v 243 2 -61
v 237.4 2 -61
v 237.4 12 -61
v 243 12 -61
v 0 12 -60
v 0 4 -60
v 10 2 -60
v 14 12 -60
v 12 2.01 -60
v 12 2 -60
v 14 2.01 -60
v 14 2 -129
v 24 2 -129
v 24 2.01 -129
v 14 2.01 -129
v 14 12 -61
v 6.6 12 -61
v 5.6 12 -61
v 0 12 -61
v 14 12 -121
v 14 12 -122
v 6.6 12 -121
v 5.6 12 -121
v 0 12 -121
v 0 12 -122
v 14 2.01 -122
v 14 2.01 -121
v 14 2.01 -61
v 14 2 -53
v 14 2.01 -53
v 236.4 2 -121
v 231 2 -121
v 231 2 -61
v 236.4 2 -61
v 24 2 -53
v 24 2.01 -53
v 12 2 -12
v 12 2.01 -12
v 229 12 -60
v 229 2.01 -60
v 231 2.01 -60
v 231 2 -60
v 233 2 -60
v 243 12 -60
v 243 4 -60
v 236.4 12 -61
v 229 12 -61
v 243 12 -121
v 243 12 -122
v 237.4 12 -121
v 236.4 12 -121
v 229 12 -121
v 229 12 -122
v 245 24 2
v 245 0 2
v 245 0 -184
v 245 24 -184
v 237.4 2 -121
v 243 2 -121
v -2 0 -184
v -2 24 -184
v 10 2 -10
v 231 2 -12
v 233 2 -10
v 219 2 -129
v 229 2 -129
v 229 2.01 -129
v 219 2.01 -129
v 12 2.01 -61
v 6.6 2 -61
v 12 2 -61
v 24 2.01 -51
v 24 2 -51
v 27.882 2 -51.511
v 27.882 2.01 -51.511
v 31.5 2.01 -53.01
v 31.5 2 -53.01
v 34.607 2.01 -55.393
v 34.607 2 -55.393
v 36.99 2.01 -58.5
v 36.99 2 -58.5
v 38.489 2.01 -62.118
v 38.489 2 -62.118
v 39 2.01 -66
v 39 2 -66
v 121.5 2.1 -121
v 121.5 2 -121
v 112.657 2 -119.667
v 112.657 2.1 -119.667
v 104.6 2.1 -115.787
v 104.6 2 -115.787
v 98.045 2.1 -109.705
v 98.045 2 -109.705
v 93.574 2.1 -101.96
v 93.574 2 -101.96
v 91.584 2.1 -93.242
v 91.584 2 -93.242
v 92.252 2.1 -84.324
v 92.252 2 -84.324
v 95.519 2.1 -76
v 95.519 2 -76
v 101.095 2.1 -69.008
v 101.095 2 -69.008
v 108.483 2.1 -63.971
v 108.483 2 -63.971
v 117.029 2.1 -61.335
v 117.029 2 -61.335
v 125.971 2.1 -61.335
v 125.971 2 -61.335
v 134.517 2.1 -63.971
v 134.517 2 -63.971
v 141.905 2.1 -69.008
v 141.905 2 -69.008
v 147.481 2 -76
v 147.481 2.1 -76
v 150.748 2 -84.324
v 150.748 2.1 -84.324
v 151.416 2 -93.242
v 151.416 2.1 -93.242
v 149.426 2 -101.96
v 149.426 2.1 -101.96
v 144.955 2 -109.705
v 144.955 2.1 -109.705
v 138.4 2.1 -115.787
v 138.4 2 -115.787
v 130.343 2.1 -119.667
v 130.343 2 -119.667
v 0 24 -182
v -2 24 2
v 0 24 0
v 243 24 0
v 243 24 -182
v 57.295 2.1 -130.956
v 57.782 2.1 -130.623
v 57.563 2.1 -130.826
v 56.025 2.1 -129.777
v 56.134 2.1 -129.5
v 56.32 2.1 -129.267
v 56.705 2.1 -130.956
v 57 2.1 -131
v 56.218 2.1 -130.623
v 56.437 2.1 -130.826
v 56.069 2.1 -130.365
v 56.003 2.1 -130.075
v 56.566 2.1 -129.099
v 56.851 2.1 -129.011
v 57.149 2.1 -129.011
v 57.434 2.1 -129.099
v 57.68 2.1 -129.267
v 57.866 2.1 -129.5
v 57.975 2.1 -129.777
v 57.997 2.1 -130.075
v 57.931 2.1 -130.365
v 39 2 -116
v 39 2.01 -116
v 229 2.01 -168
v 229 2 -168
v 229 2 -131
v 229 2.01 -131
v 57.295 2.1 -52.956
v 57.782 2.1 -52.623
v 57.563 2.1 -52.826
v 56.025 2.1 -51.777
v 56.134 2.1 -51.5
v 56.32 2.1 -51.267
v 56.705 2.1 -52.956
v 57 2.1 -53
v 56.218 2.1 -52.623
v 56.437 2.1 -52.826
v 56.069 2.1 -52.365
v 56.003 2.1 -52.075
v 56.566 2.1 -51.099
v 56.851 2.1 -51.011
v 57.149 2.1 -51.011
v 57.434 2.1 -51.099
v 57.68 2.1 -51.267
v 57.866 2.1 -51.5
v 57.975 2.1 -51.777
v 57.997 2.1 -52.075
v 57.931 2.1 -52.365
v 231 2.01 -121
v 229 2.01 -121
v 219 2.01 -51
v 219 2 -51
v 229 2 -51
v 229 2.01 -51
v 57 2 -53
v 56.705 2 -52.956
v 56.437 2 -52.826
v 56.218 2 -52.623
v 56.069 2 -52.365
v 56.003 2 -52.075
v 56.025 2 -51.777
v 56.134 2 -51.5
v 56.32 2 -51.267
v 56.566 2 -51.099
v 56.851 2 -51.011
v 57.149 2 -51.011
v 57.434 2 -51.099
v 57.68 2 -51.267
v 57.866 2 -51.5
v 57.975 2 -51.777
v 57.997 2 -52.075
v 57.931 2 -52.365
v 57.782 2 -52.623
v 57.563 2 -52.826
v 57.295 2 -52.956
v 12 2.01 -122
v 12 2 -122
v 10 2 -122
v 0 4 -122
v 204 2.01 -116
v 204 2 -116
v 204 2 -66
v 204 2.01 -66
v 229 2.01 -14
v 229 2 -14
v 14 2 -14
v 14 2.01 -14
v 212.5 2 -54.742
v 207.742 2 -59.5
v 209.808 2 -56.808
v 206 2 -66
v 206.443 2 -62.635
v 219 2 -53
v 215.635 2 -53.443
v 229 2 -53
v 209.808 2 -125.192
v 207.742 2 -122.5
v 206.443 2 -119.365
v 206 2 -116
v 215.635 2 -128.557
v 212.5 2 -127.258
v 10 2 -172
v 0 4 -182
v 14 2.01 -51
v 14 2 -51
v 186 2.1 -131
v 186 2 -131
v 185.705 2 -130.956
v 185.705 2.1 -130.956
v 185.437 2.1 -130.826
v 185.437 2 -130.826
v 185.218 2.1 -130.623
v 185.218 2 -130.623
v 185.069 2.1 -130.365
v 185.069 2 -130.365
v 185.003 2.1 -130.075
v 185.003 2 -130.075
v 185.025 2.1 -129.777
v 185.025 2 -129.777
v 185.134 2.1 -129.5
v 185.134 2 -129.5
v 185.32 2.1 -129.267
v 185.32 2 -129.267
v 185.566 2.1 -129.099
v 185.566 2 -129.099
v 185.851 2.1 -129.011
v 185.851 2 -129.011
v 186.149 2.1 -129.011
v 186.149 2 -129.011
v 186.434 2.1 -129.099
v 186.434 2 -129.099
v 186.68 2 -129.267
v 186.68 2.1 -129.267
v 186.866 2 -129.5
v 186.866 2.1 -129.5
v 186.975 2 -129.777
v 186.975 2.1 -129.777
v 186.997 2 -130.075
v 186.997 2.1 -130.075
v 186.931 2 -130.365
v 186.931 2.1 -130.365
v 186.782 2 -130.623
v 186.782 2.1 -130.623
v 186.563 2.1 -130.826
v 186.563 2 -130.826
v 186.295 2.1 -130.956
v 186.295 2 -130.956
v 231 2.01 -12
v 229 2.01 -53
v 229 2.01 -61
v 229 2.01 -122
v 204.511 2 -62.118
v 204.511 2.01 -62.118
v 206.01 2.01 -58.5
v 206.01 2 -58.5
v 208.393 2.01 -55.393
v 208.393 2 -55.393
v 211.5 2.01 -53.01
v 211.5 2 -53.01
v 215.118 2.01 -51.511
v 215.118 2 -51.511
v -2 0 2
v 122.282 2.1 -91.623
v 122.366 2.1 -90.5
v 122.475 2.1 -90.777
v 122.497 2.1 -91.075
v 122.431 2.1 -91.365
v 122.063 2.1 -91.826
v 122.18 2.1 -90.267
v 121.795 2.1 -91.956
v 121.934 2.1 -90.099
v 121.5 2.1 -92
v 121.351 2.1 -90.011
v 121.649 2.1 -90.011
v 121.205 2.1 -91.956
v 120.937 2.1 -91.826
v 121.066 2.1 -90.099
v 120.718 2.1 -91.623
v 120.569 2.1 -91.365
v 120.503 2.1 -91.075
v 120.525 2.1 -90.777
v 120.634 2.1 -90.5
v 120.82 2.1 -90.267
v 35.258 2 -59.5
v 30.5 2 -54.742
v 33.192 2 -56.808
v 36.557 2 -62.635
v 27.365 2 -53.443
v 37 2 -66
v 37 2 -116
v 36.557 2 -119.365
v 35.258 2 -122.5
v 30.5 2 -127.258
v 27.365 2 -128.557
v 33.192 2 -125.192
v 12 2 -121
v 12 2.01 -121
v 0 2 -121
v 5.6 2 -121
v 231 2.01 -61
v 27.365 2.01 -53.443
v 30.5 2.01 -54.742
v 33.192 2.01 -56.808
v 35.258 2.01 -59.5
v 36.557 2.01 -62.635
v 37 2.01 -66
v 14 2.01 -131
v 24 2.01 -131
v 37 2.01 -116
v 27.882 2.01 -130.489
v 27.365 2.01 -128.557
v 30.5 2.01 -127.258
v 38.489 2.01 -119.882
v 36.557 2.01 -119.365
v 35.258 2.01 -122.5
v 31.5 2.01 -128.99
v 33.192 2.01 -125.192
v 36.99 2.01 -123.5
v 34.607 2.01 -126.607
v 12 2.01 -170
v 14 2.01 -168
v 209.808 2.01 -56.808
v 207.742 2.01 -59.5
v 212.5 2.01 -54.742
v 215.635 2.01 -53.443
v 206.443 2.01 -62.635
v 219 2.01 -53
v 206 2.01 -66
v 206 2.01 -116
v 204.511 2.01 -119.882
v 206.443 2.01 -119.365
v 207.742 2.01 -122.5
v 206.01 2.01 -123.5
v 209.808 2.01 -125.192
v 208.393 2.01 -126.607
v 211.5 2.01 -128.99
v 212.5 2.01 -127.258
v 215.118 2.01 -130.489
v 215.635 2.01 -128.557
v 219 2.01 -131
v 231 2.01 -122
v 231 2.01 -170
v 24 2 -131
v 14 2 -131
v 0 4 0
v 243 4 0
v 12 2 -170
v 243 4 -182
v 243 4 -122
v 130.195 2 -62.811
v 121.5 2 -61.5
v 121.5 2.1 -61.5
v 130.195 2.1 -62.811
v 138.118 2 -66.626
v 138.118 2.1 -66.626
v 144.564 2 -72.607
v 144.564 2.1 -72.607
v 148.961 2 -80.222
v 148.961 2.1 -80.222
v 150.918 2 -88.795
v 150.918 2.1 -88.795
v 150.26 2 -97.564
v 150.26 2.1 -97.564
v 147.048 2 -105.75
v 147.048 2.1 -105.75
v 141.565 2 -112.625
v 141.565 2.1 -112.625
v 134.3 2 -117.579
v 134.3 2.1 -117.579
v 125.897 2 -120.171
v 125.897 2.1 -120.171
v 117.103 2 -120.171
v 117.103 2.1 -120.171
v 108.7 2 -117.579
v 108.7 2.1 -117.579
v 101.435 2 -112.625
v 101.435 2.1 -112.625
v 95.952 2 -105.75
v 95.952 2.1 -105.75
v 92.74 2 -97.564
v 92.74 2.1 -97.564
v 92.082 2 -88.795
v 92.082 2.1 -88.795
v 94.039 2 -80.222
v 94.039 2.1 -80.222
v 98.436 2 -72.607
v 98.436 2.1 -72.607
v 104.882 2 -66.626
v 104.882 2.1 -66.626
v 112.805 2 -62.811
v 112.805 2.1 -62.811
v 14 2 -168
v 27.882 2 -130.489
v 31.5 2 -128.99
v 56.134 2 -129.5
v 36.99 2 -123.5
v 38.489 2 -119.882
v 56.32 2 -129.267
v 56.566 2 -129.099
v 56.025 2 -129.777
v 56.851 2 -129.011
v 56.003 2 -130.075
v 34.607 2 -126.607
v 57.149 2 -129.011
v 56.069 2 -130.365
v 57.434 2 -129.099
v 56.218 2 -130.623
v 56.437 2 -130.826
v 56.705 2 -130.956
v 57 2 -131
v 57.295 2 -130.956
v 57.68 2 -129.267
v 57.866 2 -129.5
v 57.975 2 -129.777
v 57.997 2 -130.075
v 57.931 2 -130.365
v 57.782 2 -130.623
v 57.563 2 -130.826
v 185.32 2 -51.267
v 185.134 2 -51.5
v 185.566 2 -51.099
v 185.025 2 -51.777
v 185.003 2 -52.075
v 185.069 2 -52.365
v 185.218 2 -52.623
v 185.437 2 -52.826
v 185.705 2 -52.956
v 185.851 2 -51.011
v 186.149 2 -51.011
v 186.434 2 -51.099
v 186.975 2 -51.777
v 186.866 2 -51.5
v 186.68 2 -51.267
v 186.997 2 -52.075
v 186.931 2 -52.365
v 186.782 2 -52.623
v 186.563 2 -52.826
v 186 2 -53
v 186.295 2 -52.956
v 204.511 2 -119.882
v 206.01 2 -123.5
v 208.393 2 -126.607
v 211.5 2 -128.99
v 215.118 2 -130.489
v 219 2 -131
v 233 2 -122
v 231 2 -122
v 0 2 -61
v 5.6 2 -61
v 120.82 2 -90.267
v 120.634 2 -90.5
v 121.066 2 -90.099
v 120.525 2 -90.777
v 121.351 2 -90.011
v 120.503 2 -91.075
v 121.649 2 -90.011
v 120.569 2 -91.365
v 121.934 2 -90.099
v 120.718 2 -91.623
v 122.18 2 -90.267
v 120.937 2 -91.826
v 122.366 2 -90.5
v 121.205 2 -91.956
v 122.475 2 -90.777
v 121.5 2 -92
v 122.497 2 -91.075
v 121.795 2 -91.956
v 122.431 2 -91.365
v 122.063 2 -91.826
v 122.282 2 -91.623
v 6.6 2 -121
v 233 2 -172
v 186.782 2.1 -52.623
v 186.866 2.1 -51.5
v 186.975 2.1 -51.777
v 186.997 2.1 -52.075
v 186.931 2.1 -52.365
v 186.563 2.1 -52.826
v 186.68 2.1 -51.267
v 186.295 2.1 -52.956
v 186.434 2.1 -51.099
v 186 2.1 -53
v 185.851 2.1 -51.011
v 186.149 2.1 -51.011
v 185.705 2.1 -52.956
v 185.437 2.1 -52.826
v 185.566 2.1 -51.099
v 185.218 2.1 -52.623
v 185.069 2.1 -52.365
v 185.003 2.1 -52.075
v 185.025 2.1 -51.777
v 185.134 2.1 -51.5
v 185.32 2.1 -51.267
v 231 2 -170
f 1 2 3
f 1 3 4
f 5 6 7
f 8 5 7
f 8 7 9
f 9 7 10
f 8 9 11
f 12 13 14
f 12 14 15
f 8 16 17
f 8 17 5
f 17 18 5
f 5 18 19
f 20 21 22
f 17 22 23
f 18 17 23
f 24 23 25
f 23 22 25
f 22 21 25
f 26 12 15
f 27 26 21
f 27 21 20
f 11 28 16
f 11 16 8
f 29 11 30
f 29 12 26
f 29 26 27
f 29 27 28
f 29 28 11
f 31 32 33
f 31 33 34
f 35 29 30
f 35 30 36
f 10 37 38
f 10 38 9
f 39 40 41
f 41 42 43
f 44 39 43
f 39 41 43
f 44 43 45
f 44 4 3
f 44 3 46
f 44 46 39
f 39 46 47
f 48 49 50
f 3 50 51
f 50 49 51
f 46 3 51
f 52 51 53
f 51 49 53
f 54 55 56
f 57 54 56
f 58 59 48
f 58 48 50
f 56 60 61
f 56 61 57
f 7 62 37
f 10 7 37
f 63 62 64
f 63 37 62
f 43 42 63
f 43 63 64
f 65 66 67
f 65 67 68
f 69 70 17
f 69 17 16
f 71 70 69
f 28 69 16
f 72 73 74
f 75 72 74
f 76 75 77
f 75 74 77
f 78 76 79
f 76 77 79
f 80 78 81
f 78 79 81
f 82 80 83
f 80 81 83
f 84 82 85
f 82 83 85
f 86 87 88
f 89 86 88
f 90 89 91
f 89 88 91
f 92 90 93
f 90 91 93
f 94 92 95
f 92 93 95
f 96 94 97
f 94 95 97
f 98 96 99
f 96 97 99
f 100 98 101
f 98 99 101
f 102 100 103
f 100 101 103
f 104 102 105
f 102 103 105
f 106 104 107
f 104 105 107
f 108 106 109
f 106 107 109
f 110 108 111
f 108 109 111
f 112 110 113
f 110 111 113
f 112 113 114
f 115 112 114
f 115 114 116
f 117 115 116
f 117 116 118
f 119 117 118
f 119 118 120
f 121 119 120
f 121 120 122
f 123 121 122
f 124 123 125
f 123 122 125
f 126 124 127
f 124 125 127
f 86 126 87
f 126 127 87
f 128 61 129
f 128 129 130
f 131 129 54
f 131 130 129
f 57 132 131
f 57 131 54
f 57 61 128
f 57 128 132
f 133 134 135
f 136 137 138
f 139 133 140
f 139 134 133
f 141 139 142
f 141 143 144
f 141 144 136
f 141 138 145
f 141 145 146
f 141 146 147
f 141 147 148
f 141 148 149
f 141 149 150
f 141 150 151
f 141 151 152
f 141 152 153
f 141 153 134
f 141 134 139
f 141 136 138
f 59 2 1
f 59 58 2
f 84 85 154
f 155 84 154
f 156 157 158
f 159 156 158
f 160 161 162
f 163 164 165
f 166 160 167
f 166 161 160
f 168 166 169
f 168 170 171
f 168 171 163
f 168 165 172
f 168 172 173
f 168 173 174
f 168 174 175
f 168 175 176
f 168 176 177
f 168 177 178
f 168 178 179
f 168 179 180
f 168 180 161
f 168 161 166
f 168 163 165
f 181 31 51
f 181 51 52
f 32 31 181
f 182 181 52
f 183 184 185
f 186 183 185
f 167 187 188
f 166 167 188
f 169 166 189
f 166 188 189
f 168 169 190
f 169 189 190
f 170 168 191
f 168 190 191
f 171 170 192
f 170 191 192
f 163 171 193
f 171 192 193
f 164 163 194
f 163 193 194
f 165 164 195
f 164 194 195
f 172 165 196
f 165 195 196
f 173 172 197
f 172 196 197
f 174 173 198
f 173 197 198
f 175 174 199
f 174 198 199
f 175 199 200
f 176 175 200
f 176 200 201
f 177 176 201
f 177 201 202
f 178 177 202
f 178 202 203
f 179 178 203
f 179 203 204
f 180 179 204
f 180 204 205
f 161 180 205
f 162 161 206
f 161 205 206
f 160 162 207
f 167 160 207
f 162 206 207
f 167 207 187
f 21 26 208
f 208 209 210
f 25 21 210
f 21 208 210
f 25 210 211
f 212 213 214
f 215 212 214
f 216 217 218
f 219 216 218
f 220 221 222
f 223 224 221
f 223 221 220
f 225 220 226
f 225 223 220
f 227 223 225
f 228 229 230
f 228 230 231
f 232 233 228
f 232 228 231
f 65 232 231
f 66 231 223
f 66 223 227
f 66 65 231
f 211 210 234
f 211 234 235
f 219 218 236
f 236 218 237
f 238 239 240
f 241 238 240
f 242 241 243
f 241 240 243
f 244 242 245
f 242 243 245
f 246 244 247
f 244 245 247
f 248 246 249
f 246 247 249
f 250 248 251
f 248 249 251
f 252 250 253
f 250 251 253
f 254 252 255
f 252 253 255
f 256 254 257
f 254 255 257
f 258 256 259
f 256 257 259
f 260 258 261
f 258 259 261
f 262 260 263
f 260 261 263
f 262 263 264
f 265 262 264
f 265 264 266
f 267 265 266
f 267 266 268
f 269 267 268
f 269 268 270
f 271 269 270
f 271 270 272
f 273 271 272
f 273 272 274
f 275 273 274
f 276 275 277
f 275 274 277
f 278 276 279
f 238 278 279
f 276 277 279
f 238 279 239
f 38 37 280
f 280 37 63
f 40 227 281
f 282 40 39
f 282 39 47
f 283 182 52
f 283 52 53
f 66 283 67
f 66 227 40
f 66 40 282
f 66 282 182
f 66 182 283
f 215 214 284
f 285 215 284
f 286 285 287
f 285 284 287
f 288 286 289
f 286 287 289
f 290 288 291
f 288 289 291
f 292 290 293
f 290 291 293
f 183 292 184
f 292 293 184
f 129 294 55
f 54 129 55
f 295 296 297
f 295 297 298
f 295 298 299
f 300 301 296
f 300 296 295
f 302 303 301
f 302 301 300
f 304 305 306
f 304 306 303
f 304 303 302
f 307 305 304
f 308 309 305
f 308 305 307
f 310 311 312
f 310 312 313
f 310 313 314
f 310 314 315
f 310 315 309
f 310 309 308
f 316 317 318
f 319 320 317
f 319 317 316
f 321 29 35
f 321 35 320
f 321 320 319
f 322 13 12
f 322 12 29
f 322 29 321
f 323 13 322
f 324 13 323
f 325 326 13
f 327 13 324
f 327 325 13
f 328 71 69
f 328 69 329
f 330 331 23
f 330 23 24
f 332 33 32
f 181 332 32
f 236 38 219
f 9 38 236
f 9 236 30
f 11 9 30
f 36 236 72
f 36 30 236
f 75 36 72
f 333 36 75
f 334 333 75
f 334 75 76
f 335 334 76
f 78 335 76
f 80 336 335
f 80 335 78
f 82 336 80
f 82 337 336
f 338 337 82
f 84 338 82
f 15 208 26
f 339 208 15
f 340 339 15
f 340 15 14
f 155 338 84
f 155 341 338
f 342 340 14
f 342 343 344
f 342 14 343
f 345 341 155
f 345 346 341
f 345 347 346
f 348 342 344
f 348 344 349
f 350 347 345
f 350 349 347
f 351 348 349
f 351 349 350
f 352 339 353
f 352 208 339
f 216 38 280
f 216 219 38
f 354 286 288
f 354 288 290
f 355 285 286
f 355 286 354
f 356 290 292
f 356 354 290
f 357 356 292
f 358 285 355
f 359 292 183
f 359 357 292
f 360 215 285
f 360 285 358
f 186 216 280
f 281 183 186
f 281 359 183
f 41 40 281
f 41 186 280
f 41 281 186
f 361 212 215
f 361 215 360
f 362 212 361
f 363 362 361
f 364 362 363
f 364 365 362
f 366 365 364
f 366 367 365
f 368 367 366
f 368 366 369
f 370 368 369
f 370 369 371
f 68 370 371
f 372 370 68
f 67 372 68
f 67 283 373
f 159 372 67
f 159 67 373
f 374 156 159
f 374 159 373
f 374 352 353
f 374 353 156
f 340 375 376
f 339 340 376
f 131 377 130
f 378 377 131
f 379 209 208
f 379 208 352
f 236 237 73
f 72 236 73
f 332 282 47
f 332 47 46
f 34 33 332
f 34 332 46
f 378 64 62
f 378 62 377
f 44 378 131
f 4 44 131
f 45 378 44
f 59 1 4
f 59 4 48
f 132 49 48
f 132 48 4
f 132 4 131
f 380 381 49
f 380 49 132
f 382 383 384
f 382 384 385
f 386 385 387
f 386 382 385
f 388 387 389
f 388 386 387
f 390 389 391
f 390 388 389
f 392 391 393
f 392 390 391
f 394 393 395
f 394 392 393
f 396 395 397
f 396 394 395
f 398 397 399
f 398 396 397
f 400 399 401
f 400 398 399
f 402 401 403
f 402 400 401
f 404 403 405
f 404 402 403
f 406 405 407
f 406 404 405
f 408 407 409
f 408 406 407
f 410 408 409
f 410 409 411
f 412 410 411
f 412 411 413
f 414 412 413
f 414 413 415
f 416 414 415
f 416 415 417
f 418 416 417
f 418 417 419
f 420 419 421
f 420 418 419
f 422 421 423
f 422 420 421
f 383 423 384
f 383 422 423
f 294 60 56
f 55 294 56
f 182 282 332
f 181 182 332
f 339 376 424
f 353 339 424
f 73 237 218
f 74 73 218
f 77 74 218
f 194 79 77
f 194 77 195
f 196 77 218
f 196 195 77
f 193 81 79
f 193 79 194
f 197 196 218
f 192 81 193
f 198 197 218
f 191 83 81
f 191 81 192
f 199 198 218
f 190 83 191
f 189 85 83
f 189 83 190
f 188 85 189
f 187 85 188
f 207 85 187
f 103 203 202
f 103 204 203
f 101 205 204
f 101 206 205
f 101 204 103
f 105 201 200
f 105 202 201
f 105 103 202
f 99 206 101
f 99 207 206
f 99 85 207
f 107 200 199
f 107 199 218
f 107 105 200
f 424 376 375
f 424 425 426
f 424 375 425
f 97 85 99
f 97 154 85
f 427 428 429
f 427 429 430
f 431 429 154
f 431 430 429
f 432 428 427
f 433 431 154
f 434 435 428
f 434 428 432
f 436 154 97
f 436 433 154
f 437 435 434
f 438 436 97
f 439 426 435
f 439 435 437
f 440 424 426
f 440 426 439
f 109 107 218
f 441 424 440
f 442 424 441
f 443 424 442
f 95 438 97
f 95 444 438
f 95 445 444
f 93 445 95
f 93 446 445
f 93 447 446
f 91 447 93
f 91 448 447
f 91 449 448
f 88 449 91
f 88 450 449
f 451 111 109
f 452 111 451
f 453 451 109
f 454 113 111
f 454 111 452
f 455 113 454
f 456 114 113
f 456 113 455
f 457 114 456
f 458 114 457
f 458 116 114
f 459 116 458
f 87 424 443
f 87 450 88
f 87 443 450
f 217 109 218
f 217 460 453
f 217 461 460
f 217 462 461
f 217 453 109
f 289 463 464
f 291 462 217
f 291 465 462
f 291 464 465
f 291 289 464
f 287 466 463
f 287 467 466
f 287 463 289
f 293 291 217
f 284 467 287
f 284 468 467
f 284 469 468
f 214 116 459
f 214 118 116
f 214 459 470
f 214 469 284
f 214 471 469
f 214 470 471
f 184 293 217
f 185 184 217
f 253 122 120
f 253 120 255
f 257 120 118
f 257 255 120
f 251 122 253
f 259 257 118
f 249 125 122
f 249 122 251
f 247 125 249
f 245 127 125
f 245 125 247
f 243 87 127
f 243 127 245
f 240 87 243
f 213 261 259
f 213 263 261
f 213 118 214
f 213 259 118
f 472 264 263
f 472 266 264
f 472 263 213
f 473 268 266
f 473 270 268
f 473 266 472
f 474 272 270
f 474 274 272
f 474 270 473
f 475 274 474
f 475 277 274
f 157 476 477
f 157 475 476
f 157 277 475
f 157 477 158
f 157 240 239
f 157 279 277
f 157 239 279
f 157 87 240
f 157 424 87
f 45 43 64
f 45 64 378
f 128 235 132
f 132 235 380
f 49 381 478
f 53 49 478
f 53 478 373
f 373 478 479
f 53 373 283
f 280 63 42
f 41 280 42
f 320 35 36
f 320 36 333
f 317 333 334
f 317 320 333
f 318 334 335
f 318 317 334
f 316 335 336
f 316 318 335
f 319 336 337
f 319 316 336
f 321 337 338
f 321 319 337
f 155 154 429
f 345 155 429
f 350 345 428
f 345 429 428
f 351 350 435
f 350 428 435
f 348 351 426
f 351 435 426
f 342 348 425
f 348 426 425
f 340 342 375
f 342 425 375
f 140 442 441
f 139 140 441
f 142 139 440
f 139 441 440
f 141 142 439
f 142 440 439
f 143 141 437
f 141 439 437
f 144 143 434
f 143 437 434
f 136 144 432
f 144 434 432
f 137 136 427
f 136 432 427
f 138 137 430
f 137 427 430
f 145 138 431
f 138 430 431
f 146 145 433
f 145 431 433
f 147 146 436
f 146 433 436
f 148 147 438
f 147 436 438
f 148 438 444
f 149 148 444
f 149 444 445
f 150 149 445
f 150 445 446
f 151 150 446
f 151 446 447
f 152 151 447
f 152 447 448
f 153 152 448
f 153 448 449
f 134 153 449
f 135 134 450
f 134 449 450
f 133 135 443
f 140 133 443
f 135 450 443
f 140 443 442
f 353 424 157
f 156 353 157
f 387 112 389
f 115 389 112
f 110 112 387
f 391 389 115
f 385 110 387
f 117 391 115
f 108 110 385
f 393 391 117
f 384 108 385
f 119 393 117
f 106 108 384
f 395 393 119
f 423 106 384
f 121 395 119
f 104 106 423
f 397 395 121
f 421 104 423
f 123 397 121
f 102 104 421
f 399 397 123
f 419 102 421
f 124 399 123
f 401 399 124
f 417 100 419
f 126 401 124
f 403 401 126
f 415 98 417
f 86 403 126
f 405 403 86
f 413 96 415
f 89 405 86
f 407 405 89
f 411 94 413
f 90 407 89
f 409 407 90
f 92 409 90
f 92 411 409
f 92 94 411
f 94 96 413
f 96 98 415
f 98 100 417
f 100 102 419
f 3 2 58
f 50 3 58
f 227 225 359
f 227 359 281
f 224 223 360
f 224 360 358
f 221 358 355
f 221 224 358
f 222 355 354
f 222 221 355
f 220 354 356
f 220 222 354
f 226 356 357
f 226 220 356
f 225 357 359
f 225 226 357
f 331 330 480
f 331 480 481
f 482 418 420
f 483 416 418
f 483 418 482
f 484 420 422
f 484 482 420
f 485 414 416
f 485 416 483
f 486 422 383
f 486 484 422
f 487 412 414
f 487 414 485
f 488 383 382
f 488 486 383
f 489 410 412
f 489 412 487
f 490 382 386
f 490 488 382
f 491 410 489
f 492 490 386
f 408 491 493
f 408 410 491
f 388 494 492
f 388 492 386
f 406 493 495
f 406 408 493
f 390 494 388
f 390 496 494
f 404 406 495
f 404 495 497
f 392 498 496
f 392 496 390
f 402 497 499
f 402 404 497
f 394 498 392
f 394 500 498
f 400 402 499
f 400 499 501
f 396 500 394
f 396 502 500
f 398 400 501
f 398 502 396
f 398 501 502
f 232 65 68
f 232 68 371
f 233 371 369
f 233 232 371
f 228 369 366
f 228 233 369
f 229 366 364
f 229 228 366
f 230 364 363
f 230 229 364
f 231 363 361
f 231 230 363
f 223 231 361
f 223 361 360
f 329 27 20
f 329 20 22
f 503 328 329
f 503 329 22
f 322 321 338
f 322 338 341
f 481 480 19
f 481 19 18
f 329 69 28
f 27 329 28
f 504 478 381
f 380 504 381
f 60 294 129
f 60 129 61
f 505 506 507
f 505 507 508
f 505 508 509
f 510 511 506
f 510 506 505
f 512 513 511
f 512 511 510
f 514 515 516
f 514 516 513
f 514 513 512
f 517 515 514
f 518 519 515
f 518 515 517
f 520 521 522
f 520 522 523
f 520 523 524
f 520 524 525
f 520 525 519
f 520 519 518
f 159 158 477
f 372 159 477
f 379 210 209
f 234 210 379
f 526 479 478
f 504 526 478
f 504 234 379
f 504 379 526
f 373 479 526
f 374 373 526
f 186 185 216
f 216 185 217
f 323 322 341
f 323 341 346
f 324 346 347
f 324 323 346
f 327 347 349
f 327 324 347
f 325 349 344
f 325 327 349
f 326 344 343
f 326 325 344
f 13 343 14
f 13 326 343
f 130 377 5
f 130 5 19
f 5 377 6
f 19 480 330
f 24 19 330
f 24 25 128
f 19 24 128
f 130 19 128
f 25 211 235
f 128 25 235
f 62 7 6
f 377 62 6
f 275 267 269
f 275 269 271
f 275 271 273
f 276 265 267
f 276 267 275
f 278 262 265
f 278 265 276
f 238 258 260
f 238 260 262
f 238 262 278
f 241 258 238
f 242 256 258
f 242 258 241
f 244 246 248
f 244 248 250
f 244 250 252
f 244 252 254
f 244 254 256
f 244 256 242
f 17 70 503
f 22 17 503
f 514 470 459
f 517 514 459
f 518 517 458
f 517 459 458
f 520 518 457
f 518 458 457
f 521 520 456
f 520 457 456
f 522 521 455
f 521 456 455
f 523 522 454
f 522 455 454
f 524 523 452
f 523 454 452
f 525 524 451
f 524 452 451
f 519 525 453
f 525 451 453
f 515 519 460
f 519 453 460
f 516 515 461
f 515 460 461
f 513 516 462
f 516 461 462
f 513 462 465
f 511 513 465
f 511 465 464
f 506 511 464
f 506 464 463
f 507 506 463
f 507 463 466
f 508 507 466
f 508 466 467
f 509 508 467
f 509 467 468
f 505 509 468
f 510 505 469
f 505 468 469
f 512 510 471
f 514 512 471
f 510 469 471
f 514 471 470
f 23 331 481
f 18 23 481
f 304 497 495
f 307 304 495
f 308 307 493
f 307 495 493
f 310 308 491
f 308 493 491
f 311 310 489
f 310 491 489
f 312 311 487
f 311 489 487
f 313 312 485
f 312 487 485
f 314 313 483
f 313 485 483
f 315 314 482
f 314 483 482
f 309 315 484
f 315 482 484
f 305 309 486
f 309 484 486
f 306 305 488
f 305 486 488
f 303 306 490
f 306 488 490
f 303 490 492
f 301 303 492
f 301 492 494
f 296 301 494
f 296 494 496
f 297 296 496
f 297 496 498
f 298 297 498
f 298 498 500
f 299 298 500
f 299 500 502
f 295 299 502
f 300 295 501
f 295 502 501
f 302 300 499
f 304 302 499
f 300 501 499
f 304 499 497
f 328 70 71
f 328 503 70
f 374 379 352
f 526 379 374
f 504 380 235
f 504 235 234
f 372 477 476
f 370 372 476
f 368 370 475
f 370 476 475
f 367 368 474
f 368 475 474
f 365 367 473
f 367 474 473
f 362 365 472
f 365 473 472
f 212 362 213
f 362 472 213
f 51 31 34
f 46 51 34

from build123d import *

# Parameters (mm, degrees)
CROQUIS1_W        = 247
CROQUIS1_H        = 186
CROQUIS1_W_2      = 243
CROQUIS1_H_2      = 182
WALL_DEPTH        = 24
CROQUIS4_W        = 243
CROQUIS4_H        = 182
FIELD_DEPTH       = 2
CROQUIS5_W        = 219
CROQUIS5_H        = 158
WHITELINE_DEPTH   = 0.01
CROQUIS6_R        = 30
CROQUIS6_R_2      = 29.5
CROQUIS6_R_3      = 1
NEUTRALZONE_DEPTH = 0.1
CROQUIS8_R        = 1
NEUTRALSPOT_DEPTH = 0.1
GOALS_DEPTH       = 10
WEDGE1_DEPTH      = 243
WEDGE2_DEPTH      = 60
WEDGE3_DEPTH      = 60


with BuildPart() as part:
    # Croquis1 → Wall (new body)
    with BuildSketch(Plane(origin=(0, 0, 0), x_dir=(1, 0, 0), z_dir=(0, 1, 0))):
        with Locations((121.5, 91)):
            Rectangle(CROQUIS1_W, CROQUIS1_H)
        with Locations((121.5, 91)):
            Rectangle(CROQUIS1_W_2, CROQUIS1_H_2, mode=Mode.SUBTRACT)
    extrude(amount=WALL_DEPTH)

    # Croquis4 → Field (add)
    with BuildSketch(Plane(origin=(0, 0, 0), x_dir=(1, 0, 0), z_dir=(0, 1, 0))):
        with Locations((121.5, 91)):
            Rectangle(CROQUIS4_W, CROQUIS4_H)
    extrude(amount=FIELD_DEPTH)

    # Croquis5 → WhiteLine (add)
    with BuildSketch(Plane(origin=(0, 2, 0), x_dir=(1, 0, 0), z_dir=(0, 1, 0))):
        with Locations((121.5, 91)):
            Rectangle(CROQUIS5_W, CROQUIS5_H)
        with BuildLine():
            Line((229, 14), (14, 14))
            Line((14, 14), (14, 51))
            Line((14, 51), (24, 51))
            ThreePointArc((24, 51), (34.606601718, 55.393398282), (39, 66))
            Line((39, 66), (39, 91))
            Line((39, 91), (39, 116))
            ThreePointArc((39, 116), (34.606601718, 126.606601718), (24, 131))
            Line((24, 131), (14, 131))
            Line((14, 131), (14, 168))
            Line((14, 168), (229, 168))
            Line((229, 168), (229, 131))
            Line((229, 131), (219, 131))
            ThreePointArc((219, 131), (208.393398282, 126.606601718), (204, 116))
            Line((204, 116), (204, 91))
            Line((204, 91), (204, 66))
            ThreePointArc((204, 66), (208.393398282, 55.393398282), (219, 51))
            Line((219, 51), (229, 51))
            Line((229, 51), (229, 14))
        make_face(mode=Mode.SUBTRACT)
        with BuildLine():
            Line((219, 53), (229, 53))
            Line((229, 53), (229, 129))
            Line((229, 129), (219, 129))
            ThreePointArc((219, 129), (209.807611845, 125.192388155), (206, 116))
            Line((206, 116), (206, 93))
            Line((206, 93), (206, 89))
            Line((206, 89), (206, 66))
            ThreePointArc((206, 66), (209.807611845, 56.807611845), (219, 53))
        make_face(mode=Mode.SUBTRACT)
        with BuildLine():
            Line((24, 129), (14, 129))
            Line((14, 129), (14, 53))
            Line((14, 53), (24, 53))
            ThreePointArc((24, 53), (33.192388155, 56.807611845), (37, 66))
            Line((37, 66), (37, 89))
            Line((37, 89), (37, 93))
            Line((37, 93), (37, 116))
            ThreePointArc((37, 116), (33.192388155, 125.192388155), (24, 129))
        make_face(mode=Mode.SUBTRACT)
    extrude(amount=WHITELINE_DEPTH)

    # Croquis6 → Neutralzone (add)
    # profile 1 of 5: a face of its own
    with BuildSketch(Plane(origin=(0, 2, 0), x_dir=(1, 0, 0), z_dir=(0, 1, 0))):
        with Locations(Location((121.5, 91, 0), (0, 0, 90))):
            Circle(CROQUIS6_R)
        with Locations(Location((121.5, 91, 0), (0, 0, 270))):
            Circle(CROQUIS6_R_2, mode=Mode.SUBTRACT)
    # profile 2 of 5: a face of its own
    with BuildSketch(Plane(origin=(0, 2, 0), x_dir=(1, 0, 0), z_dir=(0, 1, 0))):
        with Locations(Location((57, 130, 0), (0, 0, 90))):
            Circle(CROQUIS6_R_3)
    # profile 3 of 5: a face of its own
    with BuildSketch(Plane(origin=(0, 2, 0), x_dir=(1, 0, 0), z_dir=(0, 1, 0))):
        with Locations(Location((57, 52, 0), (0, 0, 90))):
            Circle(CROQUIS6_R_3)
    # profile 4 of 5: a face of its own
    with BuildSketch(Plane(origin=(0, 2, 0), x_dir=(1, 0, 0), z_dir=(0, 1, 0))):
        with Locations(Location((186, 52, 0), (0, 0, 90))):
            Circle(CROQUIS6_R_3)
    # profile 5 of 5: a face of its own
    with BuildSketch(Plane(origin=(0, 2, 0), x_dir=(1, 0, 0), z_dir=(0, 1, 0))):
        with Locations(Location((186, 130, 0), (0, 0, 90))):
            Circle(CROQUIS6_R_3)
    extrude(amount=NEUTRALZONE_DEPTH)

    # Croquis8 → NeutralSpot (add)
    with BuildSketch(Plane(origin=(0, 2, 0), x_dir=(1, 0, 0), z_dir=(0, 1, 0))):
        with Locations(Location((121.5, 91, 0), (0, 0, 90))):
            Circle(CROQUIS8_R)
    extrude(amount=NEUTRALSPOT_DEPTH)

    # Croquis9 → Goals (add)
    with BuildSketch(Plane(origin=(0, 2, 0), x_dir=(1, 0, 0), z_dir=(0, 1, 0))):
        Polygon((14, 121), (6.6, 121), (6.6, 91), (6.6, 61), (14, 61), (14, 60), (5.6, 60), (0, 60), (0, 61), (5.6, 61), (5.6, 91), (5.6, 121), (0, 121), (0, 122), (5.6, 122), (14, 122), align=None)
        Polygon((229, 61), (236.4, 61), (236.4, 91), (236.4, 121), (229, 121), (229, 122), (237.4, 122), (243, 122), (243, 121), (237.4, 121), (237.4, 91), (237.4, 61), (243, 61), (243, 60), (237.4, 60), (229, 60), align=None)
    extrude(amount=GOALS_DEPTH)

    # Croquis10 → Wedge1 (add)
    with BuildSketch(Plane(origin=(0, 0, 0), x_dir=(0, 0, -1), z_dir=(1, 0, 0))):
        Polygon((0, 2), (10, 2), (0, 4), align=None)
        Polygon((182, 4), (172, 2), (182, 2), align=None)
    extrude(amount=WEDGE1_DEPTH)

    # Croquis11 → Wedge2 (add)
    with BuildSketch(Plane(origin=(0, 0, 0), x_dir=(-1, 0, 0), z_dir=(0, 0, -1))):
        Polygon((0, 4), (0, 2), (-10, 2), align=None)
        Polygon((-233, 2), (-243, 4), (-243, 2), align=None)
    extrude(amount=WEDGE2_DEPTH)

    # Croquis12 → Wedge3 (add)
    with BuildSketch(Plane.XY.offset(-182)):
        Polygon((0, 4), (0, 2), (10, 2), align=None)
        Polygon((233, 2), (243, 4), (243, 2), align=None)
    extrude(amount=WEDGE3_DEPTH)


solid = part.part
